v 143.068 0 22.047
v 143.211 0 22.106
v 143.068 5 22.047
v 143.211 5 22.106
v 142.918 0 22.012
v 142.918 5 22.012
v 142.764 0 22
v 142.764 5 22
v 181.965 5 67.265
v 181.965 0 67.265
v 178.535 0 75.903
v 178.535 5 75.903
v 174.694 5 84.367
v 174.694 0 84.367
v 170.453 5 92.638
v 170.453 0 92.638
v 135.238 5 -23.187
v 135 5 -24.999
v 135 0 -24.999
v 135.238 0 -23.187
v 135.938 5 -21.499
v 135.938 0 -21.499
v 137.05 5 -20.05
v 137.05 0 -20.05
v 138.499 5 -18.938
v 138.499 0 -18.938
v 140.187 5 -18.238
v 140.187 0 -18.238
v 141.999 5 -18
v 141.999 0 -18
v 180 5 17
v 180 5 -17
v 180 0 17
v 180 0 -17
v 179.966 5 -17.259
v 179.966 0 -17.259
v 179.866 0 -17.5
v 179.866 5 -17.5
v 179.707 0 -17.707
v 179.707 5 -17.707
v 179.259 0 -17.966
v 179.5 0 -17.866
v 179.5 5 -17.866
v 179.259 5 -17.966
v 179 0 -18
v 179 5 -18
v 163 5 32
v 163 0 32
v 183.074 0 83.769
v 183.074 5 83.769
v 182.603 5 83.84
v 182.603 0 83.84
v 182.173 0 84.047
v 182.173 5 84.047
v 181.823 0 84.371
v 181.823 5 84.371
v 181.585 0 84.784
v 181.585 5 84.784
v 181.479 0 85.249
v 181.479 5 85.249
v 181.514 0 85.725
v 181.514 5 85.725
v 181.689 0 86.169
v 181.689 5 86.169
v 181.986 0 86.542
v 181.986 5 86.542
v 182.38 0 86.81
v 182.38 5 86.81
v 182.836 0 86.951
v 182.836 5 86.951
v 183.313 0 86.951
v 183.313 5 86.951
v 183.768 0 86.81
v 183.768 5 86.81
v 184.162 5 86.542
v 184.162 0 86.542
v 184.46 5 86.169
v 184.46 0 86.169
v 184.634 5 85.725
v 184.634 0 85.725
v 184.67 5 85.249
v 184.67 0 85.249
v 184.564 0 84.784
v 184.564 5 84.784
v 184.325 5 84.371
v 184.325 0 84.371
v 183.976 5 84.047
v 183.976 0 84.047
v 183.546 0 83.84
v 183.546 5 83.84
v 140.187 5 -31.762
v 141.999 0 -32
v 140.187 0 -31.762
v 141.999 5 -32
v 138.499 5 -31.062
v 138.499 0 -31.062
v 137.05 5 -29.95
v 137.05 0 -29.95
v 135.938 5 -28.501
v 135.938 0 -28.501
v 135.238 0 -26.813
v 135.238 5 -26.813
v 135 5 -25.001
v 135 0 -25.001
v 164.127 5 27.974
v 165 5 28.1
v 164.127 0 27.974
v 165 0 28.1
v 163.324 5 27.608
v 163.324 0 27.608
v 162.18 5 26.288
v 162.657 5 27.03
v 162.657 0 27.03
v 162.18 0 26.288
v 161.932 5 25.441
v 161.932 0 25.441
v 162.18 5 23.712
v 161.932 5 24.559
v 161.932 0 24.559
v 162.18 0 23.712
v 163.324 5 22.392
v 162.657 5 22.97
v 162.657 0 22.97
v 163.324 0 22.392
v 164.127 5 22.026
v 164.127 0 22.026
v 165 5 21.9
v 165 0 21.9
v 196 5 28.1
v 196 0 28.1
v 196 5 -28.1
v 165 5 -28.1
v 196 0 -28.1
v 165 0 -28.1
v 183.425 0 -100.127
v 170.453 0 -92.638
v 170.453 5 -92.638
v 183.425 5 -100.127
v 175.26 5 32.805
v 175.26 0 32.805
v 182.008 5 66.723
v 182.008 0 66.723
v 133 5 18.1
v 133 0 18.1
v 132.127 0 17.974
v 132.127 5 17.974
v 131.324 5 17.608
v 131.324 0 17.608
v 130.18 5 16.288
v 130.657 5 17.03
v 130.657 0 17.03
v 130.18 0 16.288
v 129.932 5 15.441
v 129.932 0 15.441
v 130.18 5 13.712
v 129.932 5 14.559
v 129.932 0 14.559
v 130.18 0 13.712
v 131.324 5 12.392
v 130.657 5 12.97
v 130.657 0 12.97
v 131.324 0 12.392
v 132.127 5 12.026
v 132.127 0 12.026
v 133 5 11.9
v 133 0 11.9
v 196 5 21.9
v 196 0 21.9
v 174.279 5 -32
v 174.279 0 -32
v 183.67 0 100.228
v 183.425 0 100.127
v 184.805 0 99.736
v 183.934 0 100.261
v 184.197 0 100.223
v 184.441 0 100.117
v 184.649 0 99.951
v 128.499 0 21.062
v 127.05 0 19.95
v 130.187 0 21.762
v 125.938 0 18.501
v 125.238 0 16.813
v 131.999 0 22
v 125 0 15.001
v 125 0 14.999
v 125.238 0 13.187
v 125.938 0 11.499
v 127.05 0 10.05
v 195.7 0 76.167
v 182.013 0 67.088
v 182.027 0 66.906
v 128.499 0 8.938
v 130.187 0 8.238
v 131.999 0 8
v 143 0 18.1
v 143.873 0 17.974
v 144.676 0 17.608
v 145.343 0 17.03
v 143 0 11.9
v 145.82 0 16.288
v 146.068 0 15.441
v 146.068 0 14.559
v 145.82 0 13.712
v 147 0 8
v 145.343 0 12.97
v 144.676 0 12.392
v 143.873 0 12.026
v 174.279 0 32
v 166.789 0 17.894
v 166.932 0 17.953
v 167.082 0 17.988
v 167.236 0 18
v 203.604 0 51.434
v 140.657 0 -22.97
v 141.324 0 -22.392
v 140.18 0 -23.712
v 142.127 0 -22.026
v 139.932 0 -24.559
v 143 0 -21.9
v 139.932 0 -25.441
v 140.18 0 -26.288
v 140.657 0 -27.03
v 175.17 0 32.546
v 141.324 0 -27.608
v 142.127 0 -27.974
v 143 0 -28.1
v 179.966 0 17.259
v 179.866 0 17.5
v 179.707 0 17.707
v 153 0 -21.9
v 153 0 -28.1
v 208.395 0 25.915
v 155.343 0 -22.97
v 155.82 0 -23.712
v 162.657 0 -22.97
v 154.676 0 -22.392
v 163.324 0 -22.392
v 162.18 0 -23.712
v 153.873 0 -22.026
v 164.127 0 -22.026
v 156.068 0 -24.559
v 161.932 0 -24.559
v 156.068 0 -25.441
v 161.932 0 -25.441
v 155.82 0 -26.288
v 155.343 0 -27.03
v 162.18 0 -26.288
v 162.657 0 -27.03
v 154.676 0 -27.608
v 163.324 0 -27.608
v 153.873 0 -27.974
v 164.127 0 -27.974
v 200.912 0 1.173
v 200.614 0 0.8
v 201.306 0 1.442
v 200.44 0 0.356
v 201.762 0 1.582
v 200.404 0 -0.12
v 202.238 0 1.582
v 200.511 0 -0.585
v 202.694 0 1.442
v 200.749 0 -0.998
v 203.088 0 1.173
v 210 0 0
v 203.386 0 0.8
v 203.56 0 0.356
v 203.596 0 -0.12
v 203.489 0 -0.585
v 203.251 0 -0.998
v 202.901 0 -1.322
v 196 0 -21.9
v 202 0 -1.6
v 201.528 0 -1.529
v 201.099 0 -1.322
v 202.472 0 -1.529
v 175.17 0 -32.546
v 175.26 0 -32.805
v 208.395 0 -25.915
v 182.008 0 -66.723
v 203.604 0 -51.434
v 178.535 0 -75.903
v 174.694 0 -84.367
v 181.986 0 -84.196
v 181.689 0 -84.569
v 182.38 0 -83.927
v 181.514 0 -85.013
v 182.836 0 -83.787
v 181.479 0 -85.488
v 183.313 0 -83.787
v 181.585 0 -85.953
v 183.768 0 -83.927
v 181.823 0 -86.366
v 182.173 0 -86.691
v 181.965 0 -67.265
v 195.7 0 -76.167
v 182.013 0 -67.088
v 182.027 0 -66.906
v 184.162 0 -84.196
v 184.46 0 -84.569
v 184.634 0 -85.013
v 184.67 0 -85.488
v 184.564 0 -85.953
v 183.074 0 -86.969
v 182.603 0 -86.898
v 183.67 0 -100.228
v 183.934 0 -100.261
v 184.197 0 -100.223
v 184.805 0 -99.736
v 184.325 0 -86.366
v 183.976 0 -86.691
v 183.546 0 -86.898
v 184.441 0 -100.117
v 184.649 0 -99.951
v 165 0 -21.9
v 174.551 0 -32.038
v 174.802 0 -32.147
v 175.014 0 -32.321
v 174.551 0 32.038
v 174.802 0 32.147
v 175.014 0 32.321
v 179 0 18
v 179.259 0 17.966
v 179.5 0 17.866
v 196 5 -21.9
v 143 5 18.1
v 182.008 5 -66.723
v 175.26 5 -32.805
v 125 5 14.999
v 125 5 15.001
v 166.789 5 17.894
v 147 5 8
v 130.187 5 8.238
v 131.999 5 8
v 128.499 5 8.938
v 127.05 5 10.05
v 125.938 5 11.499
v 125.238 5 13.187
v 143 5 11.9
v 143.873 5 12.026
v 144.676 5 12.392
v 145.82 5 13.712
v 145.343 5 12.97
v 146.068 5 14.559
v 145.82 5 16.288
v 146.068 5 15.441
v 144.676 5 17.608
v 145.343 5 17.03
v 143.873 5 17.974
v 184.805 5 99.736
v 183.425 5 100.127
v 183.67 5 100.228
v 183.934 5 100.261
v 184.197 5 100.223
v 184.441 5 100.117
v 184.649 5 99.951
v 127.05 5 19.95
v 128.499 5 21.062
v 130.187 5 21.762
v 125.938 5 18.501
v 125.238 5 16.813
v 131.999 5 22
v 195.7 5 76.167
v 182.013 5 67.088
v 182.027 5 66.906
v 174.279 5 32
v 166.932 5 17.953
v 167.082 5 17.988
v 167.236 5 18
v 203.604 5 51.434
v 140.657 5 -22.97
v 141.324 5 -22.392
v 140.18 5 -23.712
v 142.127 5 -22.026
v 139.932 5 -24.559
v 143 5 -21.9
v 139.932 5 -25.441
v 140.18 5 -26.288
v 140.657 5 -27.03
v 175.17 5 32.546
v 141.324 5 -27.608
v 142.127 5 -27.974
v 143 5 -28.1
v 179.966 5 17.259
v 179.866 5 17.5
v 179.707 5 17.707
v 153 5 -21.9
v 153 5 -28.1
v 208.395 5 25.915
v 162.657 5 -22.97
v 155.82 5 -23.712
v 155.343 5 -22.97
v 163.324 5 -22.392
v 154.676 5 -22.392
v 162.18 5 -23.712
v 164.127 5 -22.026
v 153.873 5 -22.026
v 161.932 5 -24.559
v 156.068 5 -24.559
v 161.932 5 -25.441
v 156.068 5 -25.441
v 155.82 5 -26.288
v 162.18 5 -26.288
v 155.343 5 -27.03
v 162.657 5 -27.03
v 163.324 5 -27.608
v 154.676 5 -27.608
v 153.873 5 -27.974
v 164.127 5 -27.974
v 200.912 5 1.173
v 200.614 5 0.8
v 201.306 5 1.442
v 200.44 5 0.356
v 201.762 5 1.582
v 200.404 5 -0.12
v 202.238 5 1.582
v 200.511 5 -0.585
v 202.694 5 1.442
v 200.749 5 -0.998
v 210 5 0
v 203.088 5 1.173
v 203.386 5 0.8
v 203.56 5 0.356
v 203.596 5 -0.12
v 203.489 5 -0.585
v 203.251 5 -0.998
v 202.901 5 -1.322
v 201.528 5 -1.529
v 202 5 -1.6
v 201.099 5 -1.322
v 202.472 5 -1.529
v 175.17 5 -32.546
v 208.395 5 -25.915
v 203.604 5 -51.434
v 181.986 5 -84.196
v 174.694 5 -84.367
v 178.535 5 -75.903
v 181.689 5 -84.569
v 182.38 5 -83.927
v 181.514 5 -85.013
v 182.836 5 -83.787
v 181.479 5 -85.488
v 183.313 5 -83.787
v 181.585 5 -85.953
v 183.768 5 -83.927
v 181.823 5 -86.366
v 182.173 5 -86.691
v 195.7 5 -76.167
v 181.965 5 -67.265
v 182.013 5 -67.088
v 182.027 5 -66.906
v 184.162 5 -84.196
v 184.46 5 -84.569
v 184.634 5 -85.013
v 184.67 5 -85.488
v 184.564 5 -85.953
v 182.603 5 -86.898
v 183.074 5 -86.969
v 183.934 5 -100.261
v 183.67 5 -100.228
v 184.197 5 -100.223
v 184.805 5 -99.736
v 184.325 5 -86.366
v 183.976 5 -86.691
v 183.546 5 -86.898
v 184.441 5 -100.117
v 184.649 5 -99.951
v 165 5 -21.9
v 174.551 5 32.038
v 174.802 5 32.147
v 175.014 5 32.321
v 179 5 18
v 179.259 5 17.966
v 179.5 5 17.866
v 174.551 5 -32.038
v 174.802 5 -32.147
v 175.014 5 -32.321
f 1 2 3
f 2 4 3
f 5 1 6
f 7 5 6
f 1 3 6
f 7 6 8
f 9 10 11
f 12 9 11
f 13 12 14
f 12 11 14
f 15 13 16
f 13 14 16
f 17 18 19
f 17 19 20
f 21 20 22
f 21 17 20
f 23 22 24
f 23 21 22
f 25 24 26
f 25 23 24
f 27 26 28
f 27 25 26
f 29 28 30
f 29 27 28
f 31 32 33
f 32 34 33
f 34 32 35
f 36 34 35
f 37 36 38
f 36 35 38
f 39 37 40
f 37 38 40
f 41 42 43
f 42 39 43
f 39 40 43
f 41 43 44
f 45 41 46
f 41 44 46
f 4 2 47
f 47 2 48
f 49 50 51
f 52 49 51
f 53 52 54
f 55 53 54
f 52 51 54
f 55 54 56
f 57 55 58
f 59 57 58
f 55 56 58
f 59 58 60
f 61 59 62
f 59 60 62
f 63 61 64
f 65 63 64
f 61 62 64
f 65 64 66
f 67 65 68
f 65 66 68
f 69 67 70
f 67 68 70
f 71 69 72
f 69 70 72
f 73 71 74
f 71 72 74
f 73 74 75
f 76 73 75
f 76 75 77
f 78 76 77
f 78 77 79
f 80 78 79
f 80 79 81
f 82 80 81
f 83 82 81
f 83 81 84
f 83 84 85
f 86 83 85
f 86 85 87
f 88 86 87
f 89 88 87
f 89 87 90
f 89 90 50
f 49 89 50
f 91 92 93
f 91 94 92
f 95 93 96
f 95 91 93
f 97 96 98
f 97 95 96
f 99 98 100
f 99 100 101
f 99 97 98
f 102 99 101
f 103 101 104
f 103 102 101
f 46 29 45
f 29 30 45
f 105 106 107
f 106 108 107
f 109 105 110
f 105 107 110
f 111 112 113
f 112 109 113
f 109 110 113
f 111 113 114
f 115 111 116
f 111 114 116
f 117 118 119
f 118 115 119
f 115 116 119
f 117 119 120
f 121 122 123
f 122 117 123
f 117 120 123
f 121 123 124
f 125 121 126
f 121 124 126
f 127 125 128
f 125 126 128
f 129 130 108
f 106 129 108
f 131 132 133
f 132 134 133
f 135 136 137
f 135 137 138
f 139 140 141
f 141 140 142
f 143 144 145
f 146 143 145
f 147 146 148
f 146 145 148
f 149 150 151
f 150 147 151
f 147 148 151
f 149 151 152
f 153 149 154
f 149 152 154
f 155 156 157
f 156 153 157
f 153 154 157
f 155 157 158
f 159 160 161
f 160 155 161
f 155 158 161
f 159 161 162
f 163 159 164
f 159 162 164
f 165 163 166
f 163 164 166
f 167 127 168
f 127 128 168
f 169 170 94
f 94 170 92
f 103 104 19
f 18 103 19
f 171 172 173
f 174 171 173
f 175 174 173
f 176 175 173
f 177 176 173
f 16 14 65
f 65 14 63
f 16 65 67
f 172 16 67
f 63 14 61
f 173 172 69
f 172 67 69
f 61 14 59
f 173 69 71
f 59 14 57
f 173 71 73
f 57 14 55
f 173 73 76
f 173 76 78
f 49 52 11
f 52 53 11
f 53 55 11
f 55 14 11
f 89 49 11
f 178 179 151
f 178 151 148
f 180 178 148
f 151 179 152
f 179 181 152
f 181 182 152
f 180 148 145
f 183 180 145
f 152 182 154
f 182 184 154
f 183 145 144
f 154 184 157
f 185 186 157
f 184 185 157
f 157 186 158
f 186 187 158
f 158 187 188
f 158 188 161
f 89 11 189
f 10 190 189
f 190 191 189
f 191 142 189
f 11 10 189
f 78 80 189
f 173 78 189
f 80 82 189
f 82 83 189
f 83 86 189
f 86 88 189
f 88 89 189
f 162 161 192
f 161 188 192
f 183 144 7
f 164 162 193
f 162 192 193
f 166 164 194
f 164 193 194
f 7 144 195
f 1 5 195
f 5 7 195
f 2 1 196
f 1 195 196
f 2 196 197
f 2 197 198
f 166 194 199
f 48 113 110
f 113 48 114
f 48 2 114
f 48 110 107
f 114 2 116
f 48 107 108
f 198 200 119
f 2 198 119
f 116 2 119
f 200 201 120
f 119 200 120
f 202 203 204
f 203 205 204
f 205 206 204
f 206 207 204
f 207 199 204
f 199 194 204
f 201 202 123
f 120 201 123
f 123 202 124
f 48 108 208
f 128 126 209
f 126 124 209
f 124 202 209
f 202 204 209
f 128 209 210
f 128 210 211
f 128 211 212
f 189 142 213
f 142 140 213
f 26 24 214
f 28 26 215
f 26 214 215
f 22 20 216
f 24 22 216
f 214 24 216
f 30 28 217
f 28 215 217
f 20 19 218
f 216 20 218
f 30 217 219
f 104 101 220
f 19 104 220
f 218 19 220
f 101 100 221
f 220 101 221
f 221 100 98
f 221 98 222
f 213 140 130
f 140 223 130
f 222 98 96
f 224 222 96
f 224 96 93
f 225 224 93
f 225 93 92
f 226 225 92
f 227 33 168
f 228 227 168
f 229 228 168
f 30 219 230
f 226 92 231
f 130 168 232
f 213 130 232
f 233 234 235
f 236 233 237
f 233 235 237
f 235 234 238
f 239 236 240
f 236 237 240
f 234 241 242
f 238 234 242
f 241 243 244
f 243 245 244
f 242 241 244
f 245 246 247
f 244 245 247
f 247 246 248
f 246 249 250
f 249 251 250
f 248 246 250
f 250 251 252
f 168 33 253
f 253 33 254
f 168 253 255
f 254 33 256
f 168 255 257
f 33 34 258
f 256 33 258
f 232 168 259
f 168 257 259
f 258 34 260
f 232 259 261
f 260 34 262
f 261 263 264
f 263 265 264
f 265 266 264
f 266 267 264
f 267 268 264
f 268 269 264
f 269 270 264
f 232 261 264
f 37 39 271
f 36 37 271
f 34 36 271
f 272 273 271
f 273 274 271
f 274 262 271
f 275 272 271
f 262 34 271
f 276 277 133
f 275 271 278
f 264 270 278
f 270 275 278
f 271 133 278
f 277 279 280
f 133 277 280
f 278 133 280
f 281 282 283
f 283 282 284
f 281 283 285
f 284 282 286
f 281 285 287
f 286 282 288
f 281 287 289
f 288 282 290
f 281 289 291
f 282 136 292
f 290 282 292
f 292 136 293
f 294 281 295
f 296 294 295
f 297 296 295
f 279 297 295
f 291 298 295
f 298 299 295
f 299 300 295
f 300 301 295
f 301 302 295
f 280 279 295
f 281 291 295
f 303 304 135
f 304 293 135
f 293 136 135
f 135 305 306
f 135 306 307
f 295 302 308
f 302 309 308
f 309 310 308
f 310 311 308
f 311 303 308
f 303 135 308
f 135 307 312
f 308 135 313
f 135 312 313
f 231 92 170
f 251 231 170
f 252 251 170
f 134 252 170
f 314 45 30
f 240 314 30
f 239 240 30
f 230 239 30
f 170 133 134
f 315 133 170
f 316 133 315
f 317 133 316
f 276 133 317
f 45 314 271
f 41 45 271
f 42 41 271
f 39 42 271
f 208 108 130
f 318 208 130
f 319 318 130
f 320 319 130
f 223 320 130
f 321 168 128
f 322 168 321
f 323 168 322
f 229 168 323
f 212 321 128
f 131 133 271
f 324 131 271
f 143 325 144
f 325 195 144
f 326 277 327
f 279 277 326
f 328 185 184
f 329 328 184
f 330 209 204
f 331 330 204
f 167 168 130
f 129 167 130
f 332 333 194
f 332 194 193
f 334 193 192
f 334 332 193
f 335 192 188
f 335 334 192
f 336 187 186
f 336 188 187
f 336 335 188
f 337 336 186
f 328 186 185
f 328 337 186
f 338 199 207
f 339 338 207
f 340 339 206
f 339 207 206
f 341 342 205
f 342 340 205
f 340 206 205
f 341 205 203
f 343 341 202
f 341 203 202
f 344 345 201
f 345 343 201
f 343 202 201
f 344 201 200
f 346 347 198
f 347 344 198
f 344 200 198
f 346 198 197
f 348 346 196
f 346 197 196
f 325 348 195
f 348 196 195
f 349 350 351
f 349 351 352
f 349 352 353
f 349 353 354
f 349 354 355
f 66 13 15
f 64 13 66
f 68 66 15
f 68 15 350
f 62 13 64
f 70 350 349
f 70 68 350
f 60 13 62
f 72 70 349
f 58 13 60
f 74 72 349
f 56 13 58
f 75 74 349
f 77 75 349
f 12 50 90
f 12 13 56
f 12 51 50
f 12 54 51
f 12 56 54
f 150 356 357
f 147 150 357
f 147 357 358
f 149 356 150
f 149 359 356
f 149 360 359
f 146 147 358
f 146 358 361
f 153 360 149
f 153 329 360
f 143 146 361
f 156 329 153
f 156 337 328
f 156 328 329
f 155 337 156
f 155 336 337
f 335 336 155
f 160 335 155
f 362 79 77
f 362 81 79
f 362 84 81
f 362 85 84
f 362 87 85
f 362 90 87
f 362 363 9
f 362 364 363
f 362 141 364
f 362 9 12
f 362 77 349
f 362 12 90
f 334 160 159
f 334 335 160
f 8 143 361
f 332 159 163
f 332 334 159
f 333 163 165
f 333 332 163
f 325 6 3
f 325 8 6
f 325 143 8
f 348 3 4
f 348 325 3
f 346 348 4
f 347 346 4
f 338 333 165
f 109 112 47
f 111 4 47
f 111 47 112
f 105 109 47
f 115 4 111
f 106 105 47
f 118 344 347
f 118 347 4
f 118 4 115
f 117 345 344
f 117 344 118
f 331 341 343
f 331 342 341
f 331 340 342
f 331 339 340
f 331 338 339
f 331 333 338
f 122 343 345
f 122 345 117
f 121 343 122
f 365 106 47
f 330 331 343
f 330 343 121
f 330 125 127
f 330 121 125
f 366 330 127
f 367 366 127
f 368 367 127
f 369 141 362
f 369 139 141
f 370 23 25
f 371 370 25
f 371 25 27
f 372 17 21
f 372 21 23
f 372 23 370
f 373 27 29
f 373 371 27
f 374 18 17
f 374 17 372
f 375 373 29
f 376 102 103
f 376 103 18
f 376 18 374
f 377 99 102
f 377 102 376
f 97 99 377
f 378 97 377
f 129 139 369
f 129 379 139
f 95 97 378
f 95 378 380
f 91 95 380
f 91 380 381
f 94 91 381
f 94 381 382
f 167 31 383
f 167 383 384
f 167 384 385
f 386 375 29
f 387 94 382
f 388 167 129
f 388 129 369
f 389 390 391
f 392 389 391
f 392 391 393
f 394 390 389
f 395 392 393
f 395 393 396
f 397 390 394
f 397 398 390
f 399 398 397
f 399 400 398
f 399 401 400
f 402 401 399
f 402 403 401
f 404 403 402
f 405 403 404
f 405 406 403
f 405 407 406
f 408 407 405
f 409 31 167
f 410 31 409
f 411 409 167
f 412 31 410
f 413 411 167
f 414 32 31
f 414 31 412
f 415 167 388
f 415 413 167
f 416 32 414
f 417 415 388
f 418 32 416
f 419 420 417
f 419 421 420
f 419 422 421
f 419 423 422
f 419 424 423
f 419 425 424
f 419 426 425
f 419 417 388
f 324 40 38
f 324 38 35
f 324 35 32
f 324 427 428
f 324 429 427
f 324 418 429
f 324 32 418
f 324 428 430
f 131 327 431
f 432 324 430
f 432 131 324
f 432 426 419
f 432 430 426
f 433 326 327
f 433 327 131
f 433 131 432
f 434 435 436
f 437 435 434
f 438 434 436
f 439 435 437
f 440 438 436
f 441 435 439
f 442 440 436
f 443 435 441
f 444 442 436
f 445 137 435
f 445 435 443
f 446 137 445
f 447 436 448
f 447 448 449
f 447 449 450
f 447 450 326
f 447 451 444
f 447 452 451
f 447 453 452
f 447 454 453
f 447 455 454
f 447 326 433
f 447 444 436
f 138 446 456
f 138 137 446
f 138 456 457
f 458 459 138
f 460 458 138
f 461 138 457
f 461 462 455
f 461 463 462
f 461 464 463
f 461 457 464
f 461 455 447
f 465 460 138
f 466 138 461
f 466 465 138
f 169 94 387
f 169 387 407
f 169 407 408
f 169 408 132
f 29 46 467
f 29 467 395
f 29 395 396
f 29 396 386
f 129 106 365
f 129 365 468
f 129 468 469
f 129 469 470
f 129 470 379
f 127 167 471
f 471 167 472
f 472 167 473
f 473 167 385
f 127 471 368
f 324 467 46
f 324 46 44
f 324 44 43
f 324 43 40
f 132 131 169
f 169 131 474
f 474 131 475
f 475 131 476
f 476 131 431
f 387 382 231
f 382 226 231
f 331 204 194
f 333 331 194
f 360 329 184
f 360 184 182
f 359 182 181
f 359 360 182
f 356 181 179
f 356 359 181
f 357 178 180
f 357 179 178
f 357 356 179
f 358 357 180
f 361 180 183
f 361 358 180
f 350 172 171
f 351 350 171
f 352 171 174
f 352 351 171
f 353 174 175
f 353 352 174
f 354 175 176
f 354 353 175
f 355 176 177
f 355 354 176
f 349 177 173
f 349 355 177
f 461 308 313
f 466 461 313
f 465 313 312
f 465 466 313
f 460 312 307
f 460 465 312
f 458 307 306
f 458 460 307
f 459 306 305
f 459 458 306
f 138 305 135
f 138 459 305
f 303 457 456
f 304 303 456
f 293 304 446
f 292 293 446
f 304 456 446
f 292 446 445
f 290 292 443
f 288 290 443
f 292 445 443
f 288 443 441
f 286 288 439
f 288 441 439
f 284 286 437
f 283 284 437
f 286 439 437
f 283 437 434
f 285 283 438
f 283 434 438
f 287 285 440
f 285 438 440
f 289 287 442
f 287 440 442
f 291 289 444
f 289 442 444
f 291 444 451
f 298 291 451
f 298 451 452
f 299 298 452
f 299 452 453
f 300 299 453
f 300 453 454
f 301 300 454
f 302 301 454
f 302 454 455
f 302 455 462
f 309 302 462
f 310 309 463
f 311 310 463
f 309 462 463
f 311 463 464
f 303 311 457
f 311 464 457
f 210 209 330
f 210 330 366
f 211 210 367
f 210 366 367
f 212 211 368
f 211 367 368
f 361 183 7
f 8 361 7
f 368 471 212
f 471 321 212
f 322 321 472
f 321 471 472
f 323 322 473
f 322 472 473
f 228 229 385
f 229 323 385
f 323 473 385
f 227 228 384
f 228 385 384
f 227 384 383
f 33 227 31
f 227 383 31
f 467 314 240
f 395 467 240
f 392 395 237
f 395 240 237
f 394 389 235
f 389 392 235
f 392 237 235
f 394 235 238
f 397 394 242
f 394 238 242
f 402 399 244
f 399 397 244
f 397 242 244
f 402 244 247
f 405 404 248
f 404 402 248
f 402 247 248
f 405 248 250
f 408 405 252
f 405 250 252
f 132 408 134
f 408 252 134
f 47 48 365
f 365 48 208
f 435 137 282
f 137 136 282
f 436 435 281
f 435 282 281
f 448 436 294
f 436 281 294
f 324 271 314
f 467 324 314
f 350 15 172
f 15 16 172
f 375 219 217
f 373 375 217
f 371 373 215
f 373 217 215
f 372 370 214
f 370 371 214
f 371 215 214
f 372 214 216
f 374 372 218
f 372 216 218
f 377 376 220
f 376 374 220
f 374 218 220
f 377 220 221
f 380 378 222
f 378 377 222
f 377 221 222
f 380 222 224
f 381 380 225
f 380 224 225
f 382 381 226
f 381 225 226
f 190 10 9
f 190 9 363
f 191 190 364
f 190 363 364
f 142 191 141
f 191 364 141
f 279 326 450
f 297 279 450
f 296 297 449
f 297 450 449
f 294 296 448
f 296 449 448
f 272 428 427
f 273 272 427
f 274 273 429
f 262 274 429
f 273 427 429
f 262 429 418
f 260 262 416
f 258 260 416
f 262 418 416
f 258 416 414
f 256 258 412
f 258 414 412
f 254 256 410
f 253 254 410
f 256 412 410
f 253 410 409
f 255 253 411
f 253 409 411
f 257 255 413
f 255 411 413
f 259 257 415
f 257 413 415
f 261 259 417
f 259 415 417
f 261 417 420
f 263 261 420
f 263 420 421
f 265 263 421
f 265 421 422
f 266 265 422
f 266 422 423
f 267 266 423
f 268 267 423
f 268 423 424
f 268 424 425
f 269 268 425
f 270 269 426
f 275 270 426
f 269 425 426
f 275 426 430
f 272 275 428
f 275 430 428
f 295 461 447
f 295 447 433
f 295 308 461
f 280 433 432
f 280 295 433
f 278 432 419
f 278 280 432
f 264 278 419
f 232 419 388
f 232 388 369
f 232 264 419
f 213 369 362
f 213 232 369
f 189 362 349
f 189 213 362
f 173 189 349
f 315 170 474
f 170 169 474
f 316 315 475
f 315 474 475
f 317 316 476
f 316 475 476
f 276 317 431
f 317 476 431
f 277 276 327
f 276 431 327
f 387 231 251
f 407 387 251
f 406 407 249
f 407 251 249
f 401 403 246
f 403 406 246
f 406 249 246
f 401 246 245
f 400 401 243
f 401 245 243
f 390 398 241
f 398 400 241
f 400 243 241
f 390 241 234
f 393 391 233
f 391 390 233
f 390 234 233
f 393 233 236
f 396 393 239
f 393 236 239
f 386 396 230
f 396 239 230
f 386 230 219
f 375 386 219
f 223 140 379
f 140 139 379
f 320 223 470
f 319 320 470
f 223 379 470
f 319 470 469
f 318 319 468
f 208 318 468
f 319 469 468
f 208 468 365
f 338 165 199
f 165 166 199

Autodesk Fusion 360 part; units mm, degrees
sketch "スケッチ1" plane through (0, 0, 0) normal (0, 1, 0) x (1, 0, 0)
  arc A0 (181.8653, -105) -> (181.8653, 105) centre (0, 0) ccw
  line L0 (181.8653, 105) -> (0, 0)
  line L1 (0, 0) -> (181.8653, -105)
  line L2 (0, 0) -> (210, 0)
  arc A1 (168.0089, -97) -> (168.0089, 97) centre (0, 0) ccw
  line L3 (191.3426, 32) -> (135, 32)
  line L4 (135, 32) -> (135, 18)
  line L5 (135, 18) -> (193.1631, 18)
  arc A2 (165, 28.1) -> (165, 21.9) centre (165, 25) ccw
  line L6 (165, 28.1) -> (196, 28.1)
  line L7 (196, 28.1) -> (196, 21.9)
  line L8 (196, 21.9) -> (165, 21.9)
  arc A3 (143, 28.1) -> (143, 21.9) centre (143, 25) ccw
  arc A4 (153, 21.9) -> (153, 28.1) centre (153, 25) ccw
  line L9 (143, 28.1) -> (153, 28.1)
  line L10 (153, 21.9) -> (143, 21.9)
  line L11 (10, 0) -> (184.3138, 100.6401)
  arc A5 (154.1525, -89) -> (154.1525, 89) centre (0, 0) ccw
  line L12 (10, 0) -> (184.3138, -100.6401)
  line L13 (193.1631, -18) -> (167, -18)
  line L14 (163, -32) -> (191.3426, -32)
  arc A6 (133, -11.9) -> (133, -18.1) centre (133, -15) ccw
  arc A7 (143, -18.1) -> (143, -11.9) centre (143, -15) ccw
  arc A8 (165, -21.9) -> (165, -28.1) centre (165, -25) ccw
  line L15 (165, -21.9) -> (196, -21.9)
  line L16 (196, -21.9) -> (196, -28.1)
  line L17 (196, -28.1) -> (165, -28.1)
  line L18 (133, -11.9) -> (143, -11.9)
  line L19 (143, -18.1) -> (133, -18.1)
  arc A9 (183.0742, -85.3689) -> (183.0742, 85.3689) centre (0, 0) ccw
  line L20 (0, 0) -> (183.0742, 85.3689)
  line L21 (0, 0) -> (183.0742, -85.3689)
  line L22 (180, 18) -> (180, -18)
  line L23 (175.1, 32) -> (182.0632, 67)
  line L24 (175.1, -32) -> (182.0632, -67)
  line L25 (167, -18) -> (147, -8)
  line L26 (147, -8) -> (125, -8)
  line L27 (125, -8) -> (125, -22)
  line L28 (125, -22) -> (143, -22)
  line L29 (143, -22) -> (163, -32)
  point P0 (135, 25)
  point P1 (202, 0)
  point P2 (125, -15)
  dimension "d1" = 210
  dimension "d2" = 30
  dimension "d3" = 30
  dimension "d4" = 194
  dimension "d5" = 14
  dimension "d6" = 3.1
  dimension "d7" = 3.1
  dimension "d8" = 10
  dimension "d9" = 8
  dimension "d10" = 31
  dimension "d11" = 12
  dimension "d12" = 25
  dimension "d13" = 135
  dimension "d14" = 30
  dimension "d15" = 10
  dimension "d16" = 178
  dimension "d17" = 30
  dimension "d19" = 3.1
  dimension "d20" = 3.1
  dimension "d23" = 202
  dimension "d24" = 25
  dimension "d25" = 25
  dimension "d29" = 180
  dimension "d34" = 25
  dimension "d35" = 15
  dimension "d36" = 7
  dimension "d37" = 7
  dimension "d38" = 22
  dimension "d39" = 10
  dimension "d40" = 8
  dimension "d41" = 22
  dimension "d42" = 20
  dimension "d43" = 18
  dimension "d44" = 20
  dimension "d45" = 14
  dimension "d46" = 35
  dimension "d47" = 35
extrude "押し出し1" add sketch "スケッチ1" along normal blind 5 contours A0 L2 A1 L12 A9 L21 | A0 L2 A1 L11 A9 L20 | L2 A1 L15 L16 L17 A9 L21 | L2 A1 L6 L7 L8 A9 L20 | L2 A1 L13 L22 | L2 A1 L5 L22 | A1 L14 L24 | A1 A5 L13 L15 | A1 L5 L8 A5 | A1 A5 L14 L17 | A5 L13 L14 A8 L15 L17 L25 L26 L27 L28 L29 | A1 L3 L23 | L3 L4 L5 A2 L6 L8 A5 | A1 L3 L6 A5
hole "穴1" at (183.0742, 0, 85.3689) at (202, 0, 0) at (183.0742, 0, -85.3689) direction (0, 1, 0) diameter 3.2 end through all
fillet "フィレット1" radius 1 10 edges at (184.3138, 2.5, 100.6401) (184.3138, 2.5, -100.6401) (180, 2.5, -18) (180, 2.5, 18) (175.1, 2.5, 32) (175.1, 2.5, -32) (182.0632, 2.5, -67) (182.0632, 2.5, 67) (143, 2.5, 22) (167, 2.5, 18)
fillet "フィレット2" radius 7 4 edges at (135, 2.5, -18) (135, 2.5, -32) (125, 2.5, 8) (125, 2.5, 22)
